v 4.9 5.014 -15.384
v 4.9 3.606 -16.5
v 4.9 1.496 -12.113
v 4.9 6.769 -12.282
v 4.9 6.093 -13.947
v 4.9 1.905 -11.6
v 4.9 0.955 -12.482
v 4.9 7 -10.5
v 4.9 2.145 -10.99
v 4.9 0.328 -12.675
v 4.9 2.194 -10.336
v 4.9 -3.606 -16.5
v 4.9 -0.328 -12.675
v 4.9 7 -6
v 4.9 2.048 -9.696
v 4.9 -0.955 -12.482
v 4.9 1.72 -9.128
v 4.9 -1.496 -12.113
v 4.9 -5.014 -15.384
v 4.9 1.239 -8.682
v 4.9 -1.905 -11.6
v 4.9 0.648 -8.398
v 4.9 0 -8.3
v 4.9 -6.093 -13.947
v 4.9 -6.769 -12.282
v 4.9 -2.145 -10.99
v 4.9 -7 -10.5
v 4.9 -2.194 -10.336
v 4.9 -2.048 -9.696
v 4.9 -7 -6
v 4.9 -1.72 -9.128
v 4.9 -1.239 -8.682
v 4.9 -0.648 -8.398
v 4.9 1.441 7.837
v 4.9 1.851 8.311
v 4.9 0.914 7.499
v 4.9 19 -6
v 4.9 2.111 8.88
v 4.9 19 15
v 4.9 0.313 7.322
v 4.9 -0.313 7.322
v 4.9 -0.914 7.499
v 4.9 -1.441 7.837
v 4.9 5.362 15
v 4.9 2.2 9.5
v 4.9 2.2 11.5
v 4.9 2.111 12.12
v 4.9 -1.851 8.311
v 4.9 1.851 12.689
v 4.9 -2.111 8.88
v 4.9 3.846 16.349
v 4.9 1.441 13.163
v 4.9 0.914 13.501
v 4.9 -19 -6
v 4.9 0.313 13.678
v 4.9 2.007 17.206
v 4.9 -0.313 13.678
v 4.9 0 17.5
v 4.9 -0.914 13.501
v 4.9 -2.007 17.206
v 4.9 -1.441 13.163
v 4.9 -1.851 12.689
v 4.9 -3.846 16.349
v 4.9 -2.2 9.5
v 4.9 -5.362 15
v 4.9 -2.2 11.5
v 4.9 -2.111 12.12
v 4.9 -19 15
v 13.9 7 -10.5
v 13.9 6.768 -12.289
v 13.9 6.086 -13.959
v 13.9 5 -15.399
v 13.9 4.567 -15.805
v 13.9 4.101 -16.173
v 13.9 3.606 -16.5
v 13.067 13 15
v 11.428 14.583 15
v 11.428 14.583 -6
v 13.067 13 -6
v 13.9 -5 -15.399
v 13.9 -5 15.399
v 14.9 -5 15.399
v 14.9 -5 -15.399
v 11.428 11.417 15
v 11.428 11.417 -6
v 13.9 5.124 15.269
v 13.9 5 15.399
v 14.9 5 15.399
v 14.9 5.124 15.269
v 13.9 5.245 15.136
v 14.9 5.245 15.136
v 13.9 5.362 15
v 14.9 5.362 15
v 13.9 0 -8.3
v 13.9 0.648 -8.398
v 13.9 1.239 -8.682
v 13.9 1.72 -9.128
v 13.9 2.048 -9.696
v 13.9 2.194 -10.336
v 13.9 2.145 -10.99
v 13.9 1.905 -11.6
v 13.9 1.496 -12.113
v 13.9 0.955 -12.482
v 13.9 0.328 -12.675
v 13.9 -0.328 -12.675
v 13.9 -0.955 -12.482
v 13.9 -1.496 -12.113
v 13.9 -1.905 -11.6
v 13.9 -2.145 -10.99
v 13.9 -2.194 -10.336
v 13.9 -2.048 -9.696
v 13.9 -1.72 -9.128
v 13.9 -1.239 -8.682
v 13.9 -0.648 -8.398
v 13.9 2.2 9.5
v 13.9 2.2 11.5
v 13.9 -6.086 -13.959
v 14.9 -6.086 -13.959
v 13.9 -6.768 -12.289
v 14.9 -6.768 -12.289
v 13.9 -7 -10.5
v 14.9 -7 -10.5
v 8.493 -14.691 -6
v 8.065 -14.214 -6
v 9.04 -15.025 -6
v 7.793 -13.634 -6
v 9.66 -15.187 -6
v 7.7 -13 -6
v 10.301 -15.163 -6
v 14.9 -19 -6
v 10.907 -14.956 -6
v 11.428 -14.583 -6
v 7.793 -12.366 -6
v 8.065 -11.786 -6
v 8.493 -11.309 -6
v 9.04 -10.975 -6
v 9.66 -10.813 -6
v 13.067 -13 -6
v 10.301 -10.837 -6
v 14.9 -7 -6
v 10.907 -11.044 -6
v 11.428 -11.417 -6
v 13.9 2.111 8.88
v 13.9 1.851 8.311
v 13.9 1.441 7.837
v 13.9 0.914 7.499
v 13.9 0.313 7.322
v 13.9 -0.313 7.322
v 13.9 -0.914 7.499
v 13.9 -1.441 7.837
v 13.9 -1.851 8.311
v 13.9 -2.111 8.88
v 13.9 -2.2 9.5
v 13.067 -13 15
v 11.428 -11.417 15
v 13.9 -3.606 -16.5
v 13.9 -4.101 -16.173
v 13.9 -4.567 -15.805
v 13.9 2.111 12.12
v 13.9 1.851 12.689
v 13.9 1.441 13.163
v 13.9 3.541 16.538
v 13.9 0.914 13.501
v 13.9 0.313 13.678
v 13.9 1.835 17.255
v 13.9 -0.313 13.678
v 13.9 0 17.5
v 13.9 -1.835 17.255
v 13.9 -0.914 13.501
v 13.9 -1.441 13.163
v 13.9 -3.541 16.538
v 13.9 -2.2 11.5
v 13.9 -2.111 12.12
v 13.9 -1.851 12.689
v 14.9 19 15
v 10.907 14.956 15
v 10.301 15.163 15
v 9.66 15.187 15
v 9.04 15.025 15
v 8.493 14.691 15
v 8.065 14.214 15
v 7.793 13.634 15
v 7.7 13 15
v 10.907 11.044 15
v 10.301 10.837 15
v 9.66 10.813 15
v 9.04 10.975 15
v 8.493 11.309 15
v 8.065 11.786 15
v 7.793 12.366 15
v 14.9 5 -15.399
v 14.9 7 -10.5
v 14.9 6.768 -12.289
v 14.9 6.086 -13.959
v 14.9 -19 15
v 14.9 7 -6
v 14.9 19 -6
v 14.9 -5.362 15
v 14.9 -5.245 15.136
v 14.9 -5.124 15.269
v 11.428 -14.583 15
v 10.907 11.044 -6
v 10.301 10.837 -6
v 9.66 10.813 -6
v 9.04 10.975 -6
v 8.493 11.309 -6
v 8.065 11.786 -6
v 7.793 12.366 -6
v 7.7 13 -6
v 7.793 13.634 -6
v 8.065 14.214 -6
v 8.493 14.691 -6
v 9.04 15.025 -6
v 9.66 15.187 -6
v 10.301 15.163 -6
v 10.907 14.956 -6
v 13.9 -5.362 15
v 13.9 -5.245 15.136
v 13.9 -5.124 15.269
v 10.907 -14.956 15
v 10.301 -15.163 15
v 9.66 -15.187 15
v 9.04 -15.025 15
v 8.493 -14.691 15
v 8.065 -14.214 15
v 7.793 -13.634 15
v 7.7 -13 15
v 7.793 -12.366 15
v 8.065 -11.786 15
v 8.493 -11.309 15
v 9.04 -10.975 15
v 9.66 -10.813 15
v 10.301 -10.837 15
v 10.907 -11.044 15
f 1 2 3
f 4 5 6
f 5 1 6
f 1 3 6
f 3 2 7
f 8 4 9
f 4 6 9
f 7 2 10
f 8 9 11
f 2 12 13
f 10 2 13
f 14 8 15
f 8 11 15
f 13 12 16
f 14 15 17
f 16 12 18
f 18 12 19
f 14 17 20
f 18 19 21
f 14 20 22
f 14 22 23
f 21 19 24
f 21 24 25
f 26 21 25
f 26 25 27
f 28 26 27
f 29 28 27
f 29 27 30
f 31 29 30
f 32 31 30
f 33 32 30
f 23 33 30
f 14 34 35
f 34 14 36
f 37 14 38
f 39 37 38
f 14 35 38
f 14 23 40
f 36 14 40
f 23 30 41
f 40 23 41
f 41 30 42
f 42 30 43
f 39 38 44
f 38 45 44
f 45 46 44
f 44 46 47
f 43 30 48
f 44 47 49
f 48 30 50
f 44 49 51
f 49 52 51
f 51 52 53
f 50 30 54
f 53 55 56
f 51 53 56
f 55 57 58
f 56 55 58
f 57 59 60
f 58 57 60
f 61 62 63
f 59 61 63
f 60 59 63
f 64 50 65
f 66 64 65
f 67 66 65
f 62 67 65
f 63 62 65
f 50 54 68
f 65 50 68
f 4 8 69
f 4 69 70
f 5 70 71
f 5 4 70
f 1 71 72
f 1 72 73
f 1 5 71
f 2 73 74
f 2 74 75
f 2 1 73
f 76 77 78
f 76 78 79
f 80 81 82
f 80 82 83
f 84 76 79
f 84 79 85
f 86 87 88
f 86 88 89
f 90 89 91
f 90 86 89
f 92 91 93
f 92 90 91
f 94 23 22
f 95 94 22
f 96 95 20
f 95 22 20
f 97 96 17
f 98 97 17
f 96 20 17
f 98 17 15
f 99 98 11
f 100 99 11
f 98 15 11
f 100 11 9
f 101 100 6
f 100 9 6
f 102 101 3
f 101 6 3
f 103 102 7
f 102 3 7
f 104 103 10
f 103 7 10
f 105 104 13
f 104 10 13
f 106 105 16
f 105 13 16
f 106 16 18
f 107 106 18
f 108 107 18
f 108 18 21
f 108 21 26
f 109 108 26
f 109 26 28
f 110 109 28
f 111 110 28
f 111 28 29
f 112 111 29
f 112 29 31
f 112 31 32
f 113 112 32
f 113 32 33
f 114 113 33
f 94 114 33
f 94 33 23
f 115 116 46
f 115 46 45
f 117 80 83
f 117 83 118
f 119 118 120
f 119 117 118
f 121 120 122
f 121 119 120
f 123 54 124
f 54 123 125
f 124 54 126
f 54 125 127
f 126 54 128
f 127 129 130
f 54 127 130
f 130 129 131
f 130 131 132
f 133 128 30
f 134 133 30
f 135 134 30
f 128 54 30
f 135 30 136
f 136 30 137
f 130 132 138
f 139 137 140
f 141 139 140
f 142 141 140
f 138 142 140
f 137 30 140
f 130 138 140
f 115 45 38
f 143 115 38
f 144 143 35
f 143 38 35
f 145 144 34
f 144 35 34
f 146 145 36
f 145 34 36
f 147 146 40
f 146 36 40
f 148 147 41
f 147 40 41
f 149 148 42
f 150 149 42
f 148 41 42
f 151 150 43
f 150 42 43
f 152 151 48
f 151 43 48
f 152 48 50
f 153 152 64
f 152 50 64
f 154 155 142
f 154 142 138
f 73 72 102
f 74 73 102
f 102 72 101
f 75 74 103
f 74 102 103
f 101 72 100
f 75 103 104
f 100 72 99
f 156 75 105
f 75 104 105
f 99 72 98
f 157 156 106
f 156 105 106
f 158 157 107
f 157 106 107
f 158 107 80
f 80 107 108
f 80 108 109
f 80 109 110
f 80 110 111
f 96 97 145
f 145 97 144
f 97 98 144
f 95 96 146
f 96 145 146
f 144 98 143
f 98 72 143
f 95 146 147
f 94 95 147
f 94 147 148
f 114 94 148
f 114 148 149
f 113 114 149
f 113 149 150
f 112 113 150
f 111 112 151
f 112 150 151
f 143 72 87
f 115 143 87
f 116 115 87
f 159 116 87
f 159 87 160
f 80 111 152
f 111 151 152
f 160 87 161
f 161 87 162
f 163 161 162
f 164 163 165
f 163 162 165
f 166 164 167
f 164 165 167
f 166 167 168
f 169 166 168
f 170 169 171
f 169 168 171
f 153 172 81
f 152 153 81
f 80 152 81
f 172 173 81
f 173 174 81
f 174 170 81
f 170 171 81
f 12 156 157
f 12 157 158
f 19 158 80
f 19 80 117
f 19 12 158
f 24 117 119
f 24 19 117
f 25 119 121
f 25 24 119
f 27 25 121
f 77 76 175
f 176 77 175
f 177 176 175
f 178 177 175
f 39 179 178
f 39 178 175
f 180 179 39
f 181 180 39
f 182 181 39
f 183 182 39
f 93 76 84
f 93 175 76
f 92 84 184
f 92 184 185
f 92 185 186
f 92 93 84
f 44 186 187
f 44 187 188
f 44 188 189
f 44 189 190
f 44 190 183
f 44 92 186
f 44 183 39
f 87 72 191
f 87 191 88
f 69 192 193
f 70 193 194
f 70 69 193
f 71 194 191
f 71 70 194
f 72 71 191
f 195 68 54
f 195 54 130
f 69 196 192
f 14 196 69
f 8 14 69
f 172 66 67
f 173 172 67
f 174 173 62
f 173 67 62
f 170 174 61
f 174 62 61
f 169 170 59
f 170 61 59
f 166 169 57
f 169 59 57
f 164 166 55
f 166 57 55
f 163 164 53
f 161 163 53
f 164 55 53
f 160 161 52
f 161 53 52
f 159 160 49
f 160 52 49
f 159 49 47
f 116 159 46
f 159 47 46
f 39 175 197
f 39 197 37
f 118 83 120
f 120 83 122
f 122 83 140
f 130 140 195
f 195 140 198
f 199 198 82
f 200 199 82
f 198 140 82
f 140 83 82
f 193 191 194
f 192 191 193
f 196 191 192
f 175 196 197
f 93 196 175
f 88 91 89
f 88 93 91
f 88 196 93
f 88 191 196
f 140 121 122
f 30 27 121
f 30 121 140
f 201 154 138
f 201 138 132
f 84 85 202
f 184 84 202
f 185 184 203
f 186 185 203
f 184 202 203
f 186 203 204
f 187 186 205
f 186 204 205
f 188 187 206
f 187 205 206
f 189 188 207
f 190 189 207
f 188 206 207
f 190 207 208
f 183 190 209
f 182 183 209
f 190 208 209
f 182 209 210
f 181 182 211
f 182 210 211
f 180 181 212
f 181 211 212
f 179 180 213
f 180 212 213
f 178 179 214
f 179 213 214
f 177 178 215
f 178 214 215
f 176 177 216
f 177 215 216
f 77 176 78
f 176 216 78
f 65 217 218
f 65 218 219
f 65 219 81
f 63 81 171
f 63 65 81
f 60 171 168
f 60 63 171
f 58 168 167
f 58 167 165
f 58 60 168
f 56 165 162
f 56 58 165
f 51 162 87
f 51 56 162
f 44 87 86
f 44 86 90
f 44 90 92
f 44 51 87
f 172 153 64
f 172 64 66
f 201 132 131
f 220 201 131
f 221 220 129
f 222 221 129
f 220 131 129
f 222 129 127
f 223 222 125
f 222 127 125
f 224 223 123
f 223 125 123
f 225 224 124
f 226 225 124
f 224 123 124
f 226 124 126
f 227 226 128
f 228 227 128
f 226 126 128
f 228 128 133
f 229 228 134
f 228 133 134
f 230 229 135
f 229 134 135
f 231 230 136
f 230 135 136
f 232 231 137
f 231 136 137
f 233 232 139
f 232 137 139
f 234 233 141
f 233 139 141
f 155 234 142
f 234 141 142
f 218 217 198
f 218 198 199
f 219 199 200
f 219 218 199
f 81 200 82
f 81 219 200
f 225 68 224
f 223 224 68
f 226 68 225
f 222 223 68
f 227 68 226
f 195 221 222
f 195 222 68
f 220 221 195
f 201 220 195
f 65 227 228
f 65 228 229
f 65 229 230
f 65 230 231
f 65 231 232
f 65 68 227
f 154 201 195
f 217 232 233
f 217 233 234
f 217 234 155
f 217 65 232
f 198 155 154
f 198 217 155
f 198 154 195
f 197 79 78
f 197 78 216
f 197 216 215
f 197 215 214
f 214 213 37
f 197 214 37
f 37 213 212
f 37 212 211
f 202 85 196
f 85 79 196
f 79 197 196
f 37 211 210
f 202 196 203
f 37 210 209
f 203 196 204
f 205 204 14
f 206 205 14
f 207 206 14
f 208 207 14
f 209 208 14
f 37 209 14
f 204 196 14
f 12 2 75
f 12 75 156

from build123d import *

# Parameters (mm, degrees)
BOSS_EXTRUDE1_DEPTH = 9
BOSS_EXTRUDE2_DEPTH = 1
BOSS_EXTRUDE3_DEPTH = 1
SKETCH4_W           = 10
SKETCH4_H           = 21
BOSS_EXTRUDE4_DEPTH = 12
SKETCH5_W           = 10
SKETCH5_H           = 21
BOSS_EXTRUDE5_DEPTH = 12
CUT_EXTRUDE1_DEPTH  = 34.693619574
CUT_EXTRUDE2_DEPTH  = 28.699277969
CUT_EXTRUDE3_DEPTH  = 34.693619574
HOLE1_D             = 4.4


with BuildPart() as part:
    # Sketch1 → Boss-Extrude1 (new body)
    with BuildSketch(Plane(origin=(4.9, 0, 0), x_dir=(0, -1, 0), z_dir=(-1, 0, 0))):
        with BuildLine():
            Line((7, -10.5), (7, 15))
            Line((7, 15), (5.361902647, 15))
            ThreePointArc((5.361902647, 15), (0, 17.5), (-5.361902647, 15))
            Line((-5.361902647, 15), (-7, 15))
            Line((-7, 15), (-7, -10.5))
            ThreePointArc((-7, -10.5), (-6.092571663, -13.946820352), (-3.605551275, -16.5))
            Line((-3.605551275, -16.5), (3.605551275, -16.5))
            ThreePointArc((3.605551275, -16.5), (6.092571663, -13.946820352), (7, -10.5))
        make_face()
    extrude(amount=-BOSS_EXTRUDE1_DEPTH)

    # Sketch2 → Boss-Extrude2 (add)
    with BuildSketch(Plane(origin=(13.9, 0, 0), x_dir=(0, 0, -1), z_dir=(1, 0, 0))):
        with BuildLine():
            Line((-15, -7), (-15, -5.361902647))
            ThreePointArc((-15, -5.361902647), (-15.202979206, -5.184784141), (-15.398993058, -4.999986702))
            Line((-15.398993058, -4.999986702), (15.398993058, -4.999986702))
            ThreePointArc((15.398993058, -4.999986702), (13.145760107, -6.480737107), (10.5, -7))
            Line((10.5, -7), (-15, -7))
        make_face()
    extrude(amount=BOSS_EXTRUDE2_DEPTH)

    # Sketch3 → Boss-Extrude3 (add)
    with BuildSketch(Plane(origin=(13.9, 0, 0), x_dir=(0, 0, -1), z_dir=(1, 0, 0))):
        with BuildLine():
            Line((-15, 7), (10.5, 7))
            ThreePointArc((10.5, 7), (13.145742515, 6.480744289), (15.398965913, 5.000013298))
            Line((15.398965913, 5.000013298), (-15.398965913, 5.000013298))
            ThreePointArc((-15.398965913, 5.000013298), (-15.202965132, 5.184796907), (-15, 5.361902647))
            Line((-15, 5.361902647), (-15, 7))
        make_face()
    extrude(amount=BOSS_EXTRUDE3_DEPTH)

    # Sketch4 → Boss-Extrude4 (add)
    with BuildSketch(Plane.XZ.offset(7)):
        with Locations((9.9, 4.5)):
            Rectangle(SKETCH4_W, SKETCH4_H)
    extrude(amount=BOSS_EXTRUDE4_DEPTH)

    # Sketch5 → Boss-Extrude5 (add)
    with BuildSketch(Plane(origin=(0, 7, 0), x_dir=(-1, 0, 0), z_dir=(0, 1, 0))):
        with Locations((-9.9, 4.5)):
            Rectangle(SKETCH5_W, SKETCH5_H)
    extrude(amount=BOSS_EXTRUDE5_DEPTH)

    # Sketch6 → Cut-Extrude1 (cut, through all)
    with BuildSketch(Plane(origin=(0, 0, -6), x_dir=(-1, 0, 0), z_dir=(0, 0, -1))):
        with BuildLine():
            Line((-11.428248415, 14.582547561), (-13.067024387, 13))
            Line((-13.067024387, 13), (-11.428248415, 11.417452439))
            ThreePointArc((-11.428248415, 11.417452439), (-7.7, 13), (-11.428248415, 14.582547561))
        make_face()
    extrude(amount=-CUT_EXTRUDE1_DEPTH, mode=Mode.SUBTRACT)

    # Sketch7 → Cut-Extrude2 (cut, through all)
    with BuildSketch(Plane.ZY.offset(-4.9)):
        with BuildLine():
            Line((9.5, -2.2), (11.5, -2.2))
            ThreePointArc((11.5, -2.2), (13.7, 0), (11.5, 2.2))
            Line((11.5, 2.2), (9.5, 2.2))
            ThreePointArc((9.5, 2.2), (7.3, 0), (9.5, -2.2))
        make_face()
    extrude(amount=-CUT_EXTRUDE2_DEPTH, mode=Mode.SUBTRACT)

    # Sketch8 → Cut-Extrude3 (cut, through all)
    with BuildSketch(Plane(origin=(0, 0, -6), x_dir=(-1, 0, 0), z_dir=(0, 0, -1))):
        with BuildLine():
            Line((-11.428248415, -11.417452439), (-13.067024387, -13))
            Line((-13.067024387, -13), (-11.428248415, -14.582547561))
            ThreePointArc((-11.428248415, -14.582547561), (-7.7, -13), (-11.428248415, -11.417452439))
        make_face()
    extrude(amount=-CUT_EXTRUDE3_DEPTH, mode=Mode.SUBTRACT)

    # Hole1 (through all)
    with Locations(Plane(origin=(13.9, 0, 0), x_dir=(0, 0, -1), z_dir=(1, 0, 0))):
        with Locations((10.5, 0)):
            Hole(HOLE1_D / 2)


solid = part.part
